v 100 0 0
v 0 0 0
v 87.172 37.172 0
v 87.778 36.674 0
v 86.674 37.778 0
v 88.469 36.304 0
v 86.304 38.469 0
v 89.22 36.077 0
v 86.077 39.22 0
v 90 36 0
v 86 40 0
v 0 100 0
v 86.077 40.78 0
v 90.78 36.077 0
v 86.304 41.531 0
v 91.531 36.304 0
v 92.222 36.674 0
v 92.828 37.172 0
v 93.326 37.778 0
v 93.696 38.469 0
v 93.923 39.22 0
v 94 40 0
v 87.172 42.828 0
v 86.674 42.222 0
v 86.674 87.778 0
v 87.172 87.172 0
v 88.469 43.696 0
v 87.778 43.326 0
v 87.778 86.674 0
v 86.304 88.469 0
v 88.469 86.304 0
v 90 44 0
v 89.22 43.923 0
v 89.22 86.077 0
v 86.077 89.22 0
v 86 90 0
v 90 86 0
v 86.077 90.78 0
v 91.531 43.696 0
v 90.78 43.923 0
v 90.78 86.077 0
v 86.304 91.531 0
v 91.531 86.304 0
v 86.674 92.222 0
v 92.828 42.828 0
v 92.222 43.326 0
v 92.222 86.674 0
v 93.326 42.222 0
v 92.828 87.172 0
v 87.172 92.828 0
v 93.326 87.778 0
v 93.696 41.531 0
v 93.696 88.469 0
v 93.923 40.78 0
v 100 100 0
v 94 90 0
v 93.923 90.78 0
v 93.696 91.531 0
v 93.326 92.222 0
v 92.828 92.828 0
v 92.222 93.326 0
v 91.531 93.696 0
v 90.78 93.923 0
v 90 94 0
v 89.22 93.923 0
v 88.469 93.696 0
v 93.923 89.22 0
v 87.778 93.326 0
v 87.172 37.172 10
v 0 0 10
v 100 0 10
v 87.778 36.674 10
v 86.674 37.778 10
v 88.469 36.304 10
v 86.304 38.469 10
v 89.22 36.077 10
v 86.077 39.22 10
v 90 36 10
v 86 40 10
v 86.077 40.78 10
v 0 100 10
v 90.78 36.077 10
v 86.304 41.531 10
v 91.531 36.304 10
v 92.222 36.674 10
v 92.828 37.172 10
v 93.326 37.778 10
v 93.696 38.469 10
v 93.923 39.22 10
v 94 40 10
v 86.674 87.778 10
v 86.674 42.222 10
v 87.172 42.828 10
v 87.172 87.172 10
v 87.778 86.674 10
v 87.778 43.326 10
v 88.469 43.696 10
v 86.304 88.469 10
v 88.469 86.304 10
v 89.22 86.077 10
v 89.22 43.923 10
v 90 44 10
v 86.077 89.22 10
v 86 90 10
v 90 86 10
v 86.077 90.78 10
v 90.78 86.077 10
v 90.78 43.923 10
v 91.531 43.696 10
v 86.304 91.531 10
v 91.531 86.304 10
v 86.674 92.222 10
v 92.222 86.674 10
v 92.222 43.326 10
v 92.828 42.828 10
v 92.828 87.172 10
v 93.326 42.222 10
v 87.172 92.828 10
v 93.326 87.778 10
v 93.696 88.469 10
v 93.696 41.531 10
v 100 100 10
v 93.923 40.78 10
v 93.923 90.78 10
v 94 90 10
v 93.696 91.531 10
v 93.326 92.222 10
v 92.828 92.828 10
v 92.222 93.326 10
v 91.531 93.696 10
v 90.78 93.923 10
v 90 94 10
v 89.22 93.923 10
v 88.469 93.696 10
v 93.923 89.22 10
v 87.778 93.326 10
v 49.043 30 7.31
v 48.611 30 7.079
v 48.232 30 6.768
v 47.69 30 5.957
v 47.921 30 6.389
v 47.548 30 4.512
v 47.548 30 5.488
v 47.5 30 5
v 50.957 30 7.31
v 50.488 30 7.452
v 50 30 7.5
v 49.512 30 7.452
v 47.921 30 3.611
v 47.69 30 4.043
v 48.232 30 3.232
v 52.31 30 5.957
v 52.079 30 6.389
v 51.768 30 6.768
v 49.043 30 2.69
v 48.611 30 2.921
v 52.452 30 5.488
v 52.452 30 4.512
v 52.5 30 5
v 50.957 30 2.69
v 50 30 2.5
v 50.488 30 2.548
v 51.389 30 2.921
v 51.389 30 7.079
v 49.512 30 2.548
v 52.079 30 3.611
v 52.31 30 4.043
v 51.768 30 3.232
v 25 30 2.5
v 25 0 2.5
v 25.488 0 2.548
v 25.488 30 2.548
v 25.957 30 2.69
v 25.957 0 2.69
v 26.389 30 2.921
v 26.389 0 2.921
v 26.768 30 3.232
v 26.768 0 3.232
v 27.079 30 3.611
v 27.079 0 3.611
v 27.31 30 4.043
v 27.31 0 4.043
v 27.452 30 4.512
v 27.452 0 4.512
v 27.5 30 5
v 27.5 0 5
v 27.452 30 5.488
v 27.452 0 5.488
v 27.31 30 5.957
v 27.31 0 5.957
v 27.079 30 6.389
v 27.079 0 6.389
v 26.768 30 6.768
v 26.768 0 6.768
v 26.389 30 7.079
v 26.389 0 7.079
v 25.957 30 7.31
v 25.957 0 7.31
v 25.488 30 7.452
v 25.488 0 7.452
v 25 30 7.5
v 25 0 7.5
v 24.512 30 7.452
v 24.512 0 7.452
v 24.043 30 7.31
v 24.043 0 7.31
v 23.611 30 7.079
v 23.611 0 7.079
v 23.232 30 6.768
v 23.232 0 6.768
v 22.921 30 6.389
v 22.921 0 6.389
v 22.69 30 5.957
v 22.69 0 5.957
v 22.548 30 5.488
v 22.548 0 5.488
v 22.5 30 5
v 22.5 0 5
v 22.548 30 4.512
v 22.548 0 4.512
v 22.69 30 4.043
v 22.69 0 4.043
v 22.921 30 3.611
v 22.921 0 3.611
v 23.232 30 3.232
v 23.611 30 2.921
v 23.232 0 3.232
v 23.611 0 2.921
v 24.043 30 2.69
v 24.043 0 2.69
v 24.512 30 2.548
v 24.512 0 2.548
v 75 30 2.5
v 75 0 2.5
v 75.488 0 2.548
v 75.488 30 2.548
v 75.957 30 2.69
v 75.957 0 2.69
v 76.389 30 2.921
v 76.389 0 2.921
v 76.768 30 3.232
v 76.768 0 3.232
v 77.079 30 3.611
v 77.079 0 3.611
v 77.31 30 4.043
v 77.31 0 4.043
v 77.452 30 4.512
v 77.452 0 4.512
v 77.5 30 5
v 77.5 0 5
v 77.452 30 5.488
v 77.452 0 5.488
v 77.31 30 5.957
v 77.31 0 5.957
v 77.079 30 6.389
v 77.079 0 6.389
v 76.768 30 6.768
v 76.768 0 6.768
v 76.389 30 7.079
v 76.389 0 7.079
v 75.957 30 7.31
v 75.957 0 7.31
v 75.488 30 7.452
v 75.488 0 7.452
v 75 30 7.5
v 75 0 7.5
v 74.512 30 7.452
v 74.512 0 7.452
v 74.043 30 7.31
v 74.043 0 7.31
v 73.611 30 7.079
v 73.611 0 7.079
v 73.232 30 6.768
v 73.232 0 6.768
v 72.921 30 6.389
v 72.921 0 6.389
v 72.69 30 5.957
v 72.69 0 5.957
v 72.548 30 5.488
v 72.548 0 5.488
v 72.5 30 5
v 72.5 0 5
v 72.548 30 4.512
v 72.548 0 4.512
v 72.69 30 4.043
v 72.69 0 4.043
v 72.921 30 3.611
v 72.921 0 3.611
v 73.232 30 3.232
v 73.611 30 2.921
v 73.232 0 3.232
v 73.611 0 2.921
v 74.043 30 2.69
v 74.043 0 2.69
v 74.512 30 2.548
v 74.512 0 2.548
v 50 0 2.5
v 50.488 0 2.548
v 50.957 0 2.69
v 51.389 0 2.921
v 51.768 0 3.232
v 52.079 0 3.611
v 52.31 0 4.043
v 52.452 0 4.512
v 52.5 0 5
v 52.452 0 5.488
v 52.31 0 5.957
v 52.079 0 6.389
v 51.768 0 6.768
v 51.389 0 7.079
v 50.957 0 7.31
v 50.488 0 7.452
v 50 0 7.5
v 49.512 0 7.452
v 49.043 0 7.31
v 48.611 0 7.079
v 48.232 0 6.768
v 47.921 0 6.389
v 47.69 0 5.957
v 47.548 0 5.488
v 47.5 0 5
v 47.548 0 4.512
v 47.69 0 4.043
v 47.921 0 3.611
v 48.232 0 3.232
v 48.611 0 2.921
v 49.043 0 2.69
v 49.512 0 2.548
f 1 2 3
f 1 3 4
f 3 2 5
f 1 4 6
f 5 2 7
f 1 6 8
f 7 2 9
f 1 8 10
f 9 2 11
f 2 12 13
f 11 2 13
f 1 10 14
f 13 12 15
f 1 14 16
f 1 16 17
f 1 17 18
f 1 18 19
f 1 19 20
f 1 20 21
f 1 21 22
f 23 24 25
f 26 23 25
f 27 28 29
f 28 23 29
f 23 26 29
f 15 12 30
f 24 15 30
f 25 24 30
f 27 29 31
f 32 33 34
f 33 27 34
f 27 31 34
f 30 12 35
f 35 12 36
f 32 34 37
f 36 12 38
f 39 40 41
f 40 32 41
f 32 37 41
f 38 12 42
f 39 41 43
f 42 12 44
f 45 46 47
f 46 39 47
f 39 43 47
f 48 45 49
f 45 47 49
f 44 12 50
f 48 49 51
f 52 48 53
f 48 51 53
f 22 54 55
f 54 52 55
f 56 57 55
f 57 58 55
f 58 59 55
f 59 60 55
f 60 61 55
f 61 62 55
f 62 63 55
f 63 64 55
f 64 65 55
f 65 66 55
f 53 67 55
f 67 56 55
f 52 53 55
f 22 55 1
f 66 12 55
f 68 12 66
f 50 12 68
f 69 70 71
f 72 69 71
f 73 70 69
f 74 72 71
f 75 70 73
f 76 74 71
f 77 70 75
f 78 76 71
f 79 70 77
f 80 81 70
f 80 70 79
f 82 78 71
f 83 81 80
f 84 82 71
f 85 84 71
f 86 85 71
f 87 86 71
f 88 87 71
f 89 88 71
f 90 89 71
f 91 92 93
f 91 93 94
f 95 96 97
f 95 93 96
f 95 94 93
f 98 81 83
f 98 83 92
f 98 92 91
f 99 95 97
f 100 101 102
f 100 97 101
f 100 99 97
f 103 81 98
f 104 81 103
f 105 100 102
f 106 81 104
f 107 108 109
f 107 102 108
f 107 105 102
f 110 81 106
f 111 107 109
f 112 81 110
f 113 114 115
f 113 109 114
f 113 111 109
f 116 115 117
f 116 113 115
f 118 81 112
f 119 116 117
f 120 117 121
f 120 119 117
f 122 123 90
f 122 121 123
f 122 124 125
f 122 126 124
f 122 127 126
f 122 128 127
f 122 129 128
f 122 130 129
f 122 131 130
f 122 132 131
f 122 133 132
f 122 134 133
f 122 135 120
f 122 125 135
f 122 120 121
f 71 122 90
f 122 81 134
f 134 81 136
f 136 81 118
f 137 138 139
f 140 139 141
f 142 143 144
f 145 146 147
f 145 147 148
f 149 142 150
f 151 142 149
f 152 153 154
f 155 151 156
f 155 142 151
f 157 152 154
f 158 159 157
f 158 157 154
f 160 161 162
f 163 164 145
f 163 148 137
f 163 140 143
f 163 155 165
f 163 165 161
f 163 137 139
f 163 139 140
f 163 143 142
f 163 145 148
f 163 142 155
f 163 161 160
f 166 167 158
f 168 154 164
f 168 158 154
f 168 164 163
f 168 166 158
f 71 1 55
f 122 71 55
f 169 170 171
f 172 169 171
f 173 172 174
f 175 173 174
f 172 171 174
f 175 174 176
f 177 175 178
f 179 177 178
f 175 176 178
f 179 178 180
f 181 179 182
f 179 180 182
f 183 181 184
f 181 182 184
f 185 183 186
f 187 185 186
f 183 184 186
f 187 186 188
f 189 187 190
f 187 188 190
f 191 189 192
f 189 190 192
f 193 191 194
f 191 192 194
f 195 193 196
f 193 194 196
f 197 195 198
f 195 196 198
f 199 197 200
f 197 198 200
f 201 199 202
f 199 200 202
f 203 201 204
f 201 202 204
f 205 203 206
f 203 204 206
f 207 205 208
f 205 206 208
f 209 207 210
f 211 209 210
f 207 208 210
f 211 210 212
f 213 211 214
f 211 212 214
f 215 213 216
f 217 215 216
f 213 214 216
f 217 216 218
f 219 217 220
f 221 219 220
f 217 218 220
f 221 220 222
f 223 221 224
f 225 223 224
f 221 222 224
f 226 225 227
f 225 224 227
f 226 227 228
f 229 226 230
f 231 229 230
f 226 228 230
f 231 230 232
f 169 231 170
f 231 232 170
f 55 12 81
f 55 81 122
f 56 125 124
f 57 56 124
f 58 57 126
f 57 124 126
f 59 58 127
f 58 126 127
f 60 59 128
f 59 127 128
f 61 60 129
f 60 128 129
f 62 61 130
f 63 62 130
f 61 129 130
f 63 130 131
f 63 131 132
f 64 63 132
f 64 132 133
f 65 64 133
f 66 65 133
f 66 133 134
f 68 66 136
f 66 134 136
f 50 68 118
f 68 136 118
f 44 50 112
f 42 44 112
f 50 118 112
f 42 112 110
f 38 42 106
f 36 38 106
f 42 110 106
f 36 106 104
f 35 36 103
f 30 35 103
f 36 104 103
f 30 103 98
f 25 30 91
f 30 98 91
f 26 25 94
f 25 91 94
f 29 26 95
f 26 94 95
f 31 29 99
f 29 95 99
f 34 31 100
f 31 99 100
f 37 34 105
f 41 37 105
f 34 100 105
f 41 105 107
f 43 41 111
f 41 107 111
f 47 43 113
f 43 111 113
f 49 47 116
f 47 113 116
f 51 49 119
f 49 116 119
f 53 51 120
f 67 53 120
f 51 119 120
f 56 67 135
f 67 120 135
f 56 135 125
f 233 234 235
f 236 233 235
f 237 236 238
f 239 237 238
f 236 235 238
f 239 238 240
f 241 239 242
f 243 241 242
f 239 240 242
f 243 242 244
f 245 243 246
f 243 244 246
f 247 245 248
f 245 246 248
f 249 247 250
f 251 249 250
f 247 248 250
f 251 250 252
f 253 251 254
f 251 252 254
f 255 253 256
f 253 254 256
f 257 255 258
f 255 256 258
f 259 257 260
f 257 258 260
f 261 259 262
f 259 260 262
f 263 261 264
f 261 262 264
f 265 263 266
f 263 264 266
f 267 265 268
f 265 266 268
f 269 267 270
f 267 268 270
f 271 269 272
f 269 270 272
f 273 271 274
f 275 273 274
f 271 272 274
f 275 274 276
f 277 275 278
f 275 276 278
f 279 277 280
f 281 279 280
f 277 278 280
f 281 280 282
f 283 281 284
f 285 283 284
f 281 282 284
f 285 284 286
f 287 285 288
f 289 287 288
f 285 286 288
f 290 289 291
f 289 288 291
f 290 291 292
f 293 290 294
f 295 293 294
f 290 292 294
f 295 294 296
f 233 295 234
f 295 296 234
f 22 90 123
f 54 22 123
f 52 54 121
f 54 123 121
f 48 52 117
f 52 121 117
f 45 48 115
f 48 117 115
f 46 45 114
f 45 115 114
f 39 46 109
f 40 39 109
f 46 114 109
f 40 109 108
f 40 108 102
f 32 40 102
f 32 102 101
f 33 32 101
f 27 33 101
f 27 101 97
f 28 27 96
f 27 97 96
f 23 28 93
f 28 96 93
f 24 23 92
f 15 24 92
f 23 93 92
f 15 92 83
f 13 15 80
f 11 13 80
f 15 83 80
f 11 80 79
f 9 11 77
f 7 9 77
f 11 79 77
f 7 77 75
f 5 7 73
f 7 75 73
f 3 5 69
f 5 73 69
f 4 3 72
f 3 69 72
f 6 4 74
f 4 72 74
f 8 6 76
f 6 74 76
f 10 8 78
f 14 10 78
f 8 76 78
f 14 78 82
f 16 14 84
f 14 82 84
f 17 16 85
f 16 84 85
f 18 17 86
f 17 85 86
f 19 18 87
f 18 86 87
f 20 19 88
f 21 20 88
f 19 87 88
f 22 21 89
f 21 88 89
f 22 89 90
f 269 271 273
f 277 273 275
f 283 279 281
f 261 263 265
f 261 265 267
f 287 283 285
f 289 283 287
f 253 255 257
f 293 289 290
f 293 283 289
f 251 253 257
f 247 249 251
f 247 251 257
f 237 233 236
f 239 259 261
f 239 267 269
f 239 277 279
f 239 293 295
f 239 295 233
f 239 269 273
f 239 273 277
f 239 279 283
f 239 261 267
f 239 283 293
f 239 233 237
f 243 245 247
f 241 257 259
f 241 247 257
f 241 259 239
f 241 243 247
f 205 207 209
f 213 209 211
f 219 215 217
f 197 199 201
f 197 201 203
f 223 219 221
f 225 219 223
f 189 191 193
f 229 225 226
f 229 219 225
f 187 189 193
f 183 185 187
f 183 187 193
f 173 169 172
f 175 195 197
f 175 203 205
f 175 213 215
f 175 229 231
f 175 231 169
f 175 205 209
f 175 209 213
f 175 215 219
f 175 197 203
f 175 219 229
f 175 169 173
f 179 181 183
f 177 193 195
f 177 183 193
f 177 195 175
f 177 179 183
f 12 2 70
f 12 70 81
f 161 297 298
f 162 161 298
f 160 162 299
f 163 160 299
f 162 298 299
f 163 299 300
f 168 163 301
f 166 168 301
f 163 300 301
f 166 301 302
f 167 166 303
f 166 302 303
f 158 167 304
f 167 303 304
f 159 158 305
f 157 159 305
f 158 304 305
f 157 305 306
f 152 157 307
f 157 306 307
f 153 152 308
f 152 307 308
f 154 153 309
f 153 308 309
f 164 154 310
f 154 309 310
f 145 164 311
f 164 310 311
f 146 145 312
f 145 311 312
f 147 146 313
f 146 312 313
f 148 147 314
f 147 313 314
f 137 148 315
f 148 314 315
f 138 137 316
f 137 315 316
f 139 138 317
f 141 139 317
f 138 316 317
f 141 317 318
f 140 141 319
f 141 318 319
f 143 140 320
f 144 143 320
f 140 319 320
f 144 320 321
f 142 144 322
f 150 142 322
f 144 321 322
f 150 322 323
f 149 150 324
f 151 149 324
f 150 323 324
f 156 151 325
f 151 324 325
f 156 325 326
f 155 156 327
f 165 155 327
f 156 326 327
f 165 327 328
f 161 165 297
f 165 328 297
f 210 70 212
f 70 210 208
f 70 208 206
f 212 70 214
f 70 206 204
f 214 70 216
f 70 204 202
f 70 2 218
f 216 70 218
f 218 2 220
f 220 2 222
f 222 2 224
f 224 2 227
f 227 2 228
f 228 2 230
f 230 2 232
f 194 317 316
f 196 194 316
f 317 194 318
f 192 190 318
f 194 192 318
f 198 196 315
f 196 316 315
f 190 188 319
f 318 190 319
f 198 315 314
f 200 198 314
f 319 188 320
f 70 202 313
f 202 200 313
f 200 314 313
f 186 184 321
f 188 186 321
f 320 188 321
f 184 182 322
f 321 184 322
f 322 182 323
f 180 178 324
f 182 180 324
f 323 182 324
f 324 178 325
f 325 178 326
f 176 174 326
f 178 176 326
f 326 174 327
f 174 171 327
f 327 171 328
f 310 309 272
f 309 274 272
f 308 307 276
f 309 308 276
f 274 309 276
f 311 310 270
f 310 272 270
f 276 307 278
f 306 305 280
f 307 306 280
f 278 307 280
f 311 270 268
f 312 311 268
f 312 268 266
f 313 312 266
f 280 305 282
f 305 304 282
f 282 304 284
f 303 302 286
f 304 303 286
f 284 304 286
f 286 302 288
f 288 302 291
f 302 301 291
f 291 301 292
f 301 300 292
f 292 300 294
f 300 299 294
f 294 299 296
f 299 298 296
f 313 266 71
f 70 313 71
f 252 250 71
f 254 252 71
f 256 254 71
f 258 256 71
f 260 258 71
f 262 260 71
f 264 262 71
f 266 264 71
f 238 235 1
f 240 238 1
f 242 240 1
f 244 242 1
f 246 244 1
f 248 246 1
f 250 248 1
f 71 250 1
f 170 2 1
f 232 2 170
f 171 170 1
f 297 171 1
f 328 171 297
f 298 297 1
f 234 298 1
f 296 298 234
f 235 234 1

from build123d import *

# Parameters (mm, degrees)
SKETCH1_W           = 100
SKETCH1_H           = 100
BOSS_EXTRUDE1_DEPTH = 10
SKETCH2_R           = 2.5
CUT_EXTRUDE1_DEPTH  = 30
SKETCH3_R           = 4
CUT_EXTRUDE2_DEPTH  = 10


with BuildPart() as part:
    # Sketch1 → Boss-Extrude1 (new body)
    with BuildSketch(Plane.XY):
        with Locations((50, 50)):
            Rectangle(SKETCH1_W, SKETCH1_H)
    extrude(amount=BOSS_EXTRUDE1_DEPTH)

    # Sketch2 → Cut-Extrude1 (cut)
    with BuildSketch(Plane.XZ):
        with Locations(Location((25, 5, 0), (0, 0, 270))):
            Circle(SKETCH2_R)
        with Locations(Location((50, 5, 0), (0, 0, 270))):
            Circle(SKETCH2_R)
        with Locations(Location((75, 5, 0), (0, 0, 270))):
            Circle(SKETCH2_R)
    extrude(amount=-CUT_EXTRUDE1_DEPTH, mode=Mode.SUBTRACT)

    # Sketch3 → Cut-Extrude2 (cut)
    with BuildSketch(Plane.XY.offset(10)):
        with Locations((90, 90)):
            Circle(SKETCH3_R)
        with Locations((90, 40)):
            Circle(SKETCH3_R)
    extrude(amount=-CUT_EXTRUDE2_DEPTH, mode=Mode.SUBTRACT)


solid = part.part
